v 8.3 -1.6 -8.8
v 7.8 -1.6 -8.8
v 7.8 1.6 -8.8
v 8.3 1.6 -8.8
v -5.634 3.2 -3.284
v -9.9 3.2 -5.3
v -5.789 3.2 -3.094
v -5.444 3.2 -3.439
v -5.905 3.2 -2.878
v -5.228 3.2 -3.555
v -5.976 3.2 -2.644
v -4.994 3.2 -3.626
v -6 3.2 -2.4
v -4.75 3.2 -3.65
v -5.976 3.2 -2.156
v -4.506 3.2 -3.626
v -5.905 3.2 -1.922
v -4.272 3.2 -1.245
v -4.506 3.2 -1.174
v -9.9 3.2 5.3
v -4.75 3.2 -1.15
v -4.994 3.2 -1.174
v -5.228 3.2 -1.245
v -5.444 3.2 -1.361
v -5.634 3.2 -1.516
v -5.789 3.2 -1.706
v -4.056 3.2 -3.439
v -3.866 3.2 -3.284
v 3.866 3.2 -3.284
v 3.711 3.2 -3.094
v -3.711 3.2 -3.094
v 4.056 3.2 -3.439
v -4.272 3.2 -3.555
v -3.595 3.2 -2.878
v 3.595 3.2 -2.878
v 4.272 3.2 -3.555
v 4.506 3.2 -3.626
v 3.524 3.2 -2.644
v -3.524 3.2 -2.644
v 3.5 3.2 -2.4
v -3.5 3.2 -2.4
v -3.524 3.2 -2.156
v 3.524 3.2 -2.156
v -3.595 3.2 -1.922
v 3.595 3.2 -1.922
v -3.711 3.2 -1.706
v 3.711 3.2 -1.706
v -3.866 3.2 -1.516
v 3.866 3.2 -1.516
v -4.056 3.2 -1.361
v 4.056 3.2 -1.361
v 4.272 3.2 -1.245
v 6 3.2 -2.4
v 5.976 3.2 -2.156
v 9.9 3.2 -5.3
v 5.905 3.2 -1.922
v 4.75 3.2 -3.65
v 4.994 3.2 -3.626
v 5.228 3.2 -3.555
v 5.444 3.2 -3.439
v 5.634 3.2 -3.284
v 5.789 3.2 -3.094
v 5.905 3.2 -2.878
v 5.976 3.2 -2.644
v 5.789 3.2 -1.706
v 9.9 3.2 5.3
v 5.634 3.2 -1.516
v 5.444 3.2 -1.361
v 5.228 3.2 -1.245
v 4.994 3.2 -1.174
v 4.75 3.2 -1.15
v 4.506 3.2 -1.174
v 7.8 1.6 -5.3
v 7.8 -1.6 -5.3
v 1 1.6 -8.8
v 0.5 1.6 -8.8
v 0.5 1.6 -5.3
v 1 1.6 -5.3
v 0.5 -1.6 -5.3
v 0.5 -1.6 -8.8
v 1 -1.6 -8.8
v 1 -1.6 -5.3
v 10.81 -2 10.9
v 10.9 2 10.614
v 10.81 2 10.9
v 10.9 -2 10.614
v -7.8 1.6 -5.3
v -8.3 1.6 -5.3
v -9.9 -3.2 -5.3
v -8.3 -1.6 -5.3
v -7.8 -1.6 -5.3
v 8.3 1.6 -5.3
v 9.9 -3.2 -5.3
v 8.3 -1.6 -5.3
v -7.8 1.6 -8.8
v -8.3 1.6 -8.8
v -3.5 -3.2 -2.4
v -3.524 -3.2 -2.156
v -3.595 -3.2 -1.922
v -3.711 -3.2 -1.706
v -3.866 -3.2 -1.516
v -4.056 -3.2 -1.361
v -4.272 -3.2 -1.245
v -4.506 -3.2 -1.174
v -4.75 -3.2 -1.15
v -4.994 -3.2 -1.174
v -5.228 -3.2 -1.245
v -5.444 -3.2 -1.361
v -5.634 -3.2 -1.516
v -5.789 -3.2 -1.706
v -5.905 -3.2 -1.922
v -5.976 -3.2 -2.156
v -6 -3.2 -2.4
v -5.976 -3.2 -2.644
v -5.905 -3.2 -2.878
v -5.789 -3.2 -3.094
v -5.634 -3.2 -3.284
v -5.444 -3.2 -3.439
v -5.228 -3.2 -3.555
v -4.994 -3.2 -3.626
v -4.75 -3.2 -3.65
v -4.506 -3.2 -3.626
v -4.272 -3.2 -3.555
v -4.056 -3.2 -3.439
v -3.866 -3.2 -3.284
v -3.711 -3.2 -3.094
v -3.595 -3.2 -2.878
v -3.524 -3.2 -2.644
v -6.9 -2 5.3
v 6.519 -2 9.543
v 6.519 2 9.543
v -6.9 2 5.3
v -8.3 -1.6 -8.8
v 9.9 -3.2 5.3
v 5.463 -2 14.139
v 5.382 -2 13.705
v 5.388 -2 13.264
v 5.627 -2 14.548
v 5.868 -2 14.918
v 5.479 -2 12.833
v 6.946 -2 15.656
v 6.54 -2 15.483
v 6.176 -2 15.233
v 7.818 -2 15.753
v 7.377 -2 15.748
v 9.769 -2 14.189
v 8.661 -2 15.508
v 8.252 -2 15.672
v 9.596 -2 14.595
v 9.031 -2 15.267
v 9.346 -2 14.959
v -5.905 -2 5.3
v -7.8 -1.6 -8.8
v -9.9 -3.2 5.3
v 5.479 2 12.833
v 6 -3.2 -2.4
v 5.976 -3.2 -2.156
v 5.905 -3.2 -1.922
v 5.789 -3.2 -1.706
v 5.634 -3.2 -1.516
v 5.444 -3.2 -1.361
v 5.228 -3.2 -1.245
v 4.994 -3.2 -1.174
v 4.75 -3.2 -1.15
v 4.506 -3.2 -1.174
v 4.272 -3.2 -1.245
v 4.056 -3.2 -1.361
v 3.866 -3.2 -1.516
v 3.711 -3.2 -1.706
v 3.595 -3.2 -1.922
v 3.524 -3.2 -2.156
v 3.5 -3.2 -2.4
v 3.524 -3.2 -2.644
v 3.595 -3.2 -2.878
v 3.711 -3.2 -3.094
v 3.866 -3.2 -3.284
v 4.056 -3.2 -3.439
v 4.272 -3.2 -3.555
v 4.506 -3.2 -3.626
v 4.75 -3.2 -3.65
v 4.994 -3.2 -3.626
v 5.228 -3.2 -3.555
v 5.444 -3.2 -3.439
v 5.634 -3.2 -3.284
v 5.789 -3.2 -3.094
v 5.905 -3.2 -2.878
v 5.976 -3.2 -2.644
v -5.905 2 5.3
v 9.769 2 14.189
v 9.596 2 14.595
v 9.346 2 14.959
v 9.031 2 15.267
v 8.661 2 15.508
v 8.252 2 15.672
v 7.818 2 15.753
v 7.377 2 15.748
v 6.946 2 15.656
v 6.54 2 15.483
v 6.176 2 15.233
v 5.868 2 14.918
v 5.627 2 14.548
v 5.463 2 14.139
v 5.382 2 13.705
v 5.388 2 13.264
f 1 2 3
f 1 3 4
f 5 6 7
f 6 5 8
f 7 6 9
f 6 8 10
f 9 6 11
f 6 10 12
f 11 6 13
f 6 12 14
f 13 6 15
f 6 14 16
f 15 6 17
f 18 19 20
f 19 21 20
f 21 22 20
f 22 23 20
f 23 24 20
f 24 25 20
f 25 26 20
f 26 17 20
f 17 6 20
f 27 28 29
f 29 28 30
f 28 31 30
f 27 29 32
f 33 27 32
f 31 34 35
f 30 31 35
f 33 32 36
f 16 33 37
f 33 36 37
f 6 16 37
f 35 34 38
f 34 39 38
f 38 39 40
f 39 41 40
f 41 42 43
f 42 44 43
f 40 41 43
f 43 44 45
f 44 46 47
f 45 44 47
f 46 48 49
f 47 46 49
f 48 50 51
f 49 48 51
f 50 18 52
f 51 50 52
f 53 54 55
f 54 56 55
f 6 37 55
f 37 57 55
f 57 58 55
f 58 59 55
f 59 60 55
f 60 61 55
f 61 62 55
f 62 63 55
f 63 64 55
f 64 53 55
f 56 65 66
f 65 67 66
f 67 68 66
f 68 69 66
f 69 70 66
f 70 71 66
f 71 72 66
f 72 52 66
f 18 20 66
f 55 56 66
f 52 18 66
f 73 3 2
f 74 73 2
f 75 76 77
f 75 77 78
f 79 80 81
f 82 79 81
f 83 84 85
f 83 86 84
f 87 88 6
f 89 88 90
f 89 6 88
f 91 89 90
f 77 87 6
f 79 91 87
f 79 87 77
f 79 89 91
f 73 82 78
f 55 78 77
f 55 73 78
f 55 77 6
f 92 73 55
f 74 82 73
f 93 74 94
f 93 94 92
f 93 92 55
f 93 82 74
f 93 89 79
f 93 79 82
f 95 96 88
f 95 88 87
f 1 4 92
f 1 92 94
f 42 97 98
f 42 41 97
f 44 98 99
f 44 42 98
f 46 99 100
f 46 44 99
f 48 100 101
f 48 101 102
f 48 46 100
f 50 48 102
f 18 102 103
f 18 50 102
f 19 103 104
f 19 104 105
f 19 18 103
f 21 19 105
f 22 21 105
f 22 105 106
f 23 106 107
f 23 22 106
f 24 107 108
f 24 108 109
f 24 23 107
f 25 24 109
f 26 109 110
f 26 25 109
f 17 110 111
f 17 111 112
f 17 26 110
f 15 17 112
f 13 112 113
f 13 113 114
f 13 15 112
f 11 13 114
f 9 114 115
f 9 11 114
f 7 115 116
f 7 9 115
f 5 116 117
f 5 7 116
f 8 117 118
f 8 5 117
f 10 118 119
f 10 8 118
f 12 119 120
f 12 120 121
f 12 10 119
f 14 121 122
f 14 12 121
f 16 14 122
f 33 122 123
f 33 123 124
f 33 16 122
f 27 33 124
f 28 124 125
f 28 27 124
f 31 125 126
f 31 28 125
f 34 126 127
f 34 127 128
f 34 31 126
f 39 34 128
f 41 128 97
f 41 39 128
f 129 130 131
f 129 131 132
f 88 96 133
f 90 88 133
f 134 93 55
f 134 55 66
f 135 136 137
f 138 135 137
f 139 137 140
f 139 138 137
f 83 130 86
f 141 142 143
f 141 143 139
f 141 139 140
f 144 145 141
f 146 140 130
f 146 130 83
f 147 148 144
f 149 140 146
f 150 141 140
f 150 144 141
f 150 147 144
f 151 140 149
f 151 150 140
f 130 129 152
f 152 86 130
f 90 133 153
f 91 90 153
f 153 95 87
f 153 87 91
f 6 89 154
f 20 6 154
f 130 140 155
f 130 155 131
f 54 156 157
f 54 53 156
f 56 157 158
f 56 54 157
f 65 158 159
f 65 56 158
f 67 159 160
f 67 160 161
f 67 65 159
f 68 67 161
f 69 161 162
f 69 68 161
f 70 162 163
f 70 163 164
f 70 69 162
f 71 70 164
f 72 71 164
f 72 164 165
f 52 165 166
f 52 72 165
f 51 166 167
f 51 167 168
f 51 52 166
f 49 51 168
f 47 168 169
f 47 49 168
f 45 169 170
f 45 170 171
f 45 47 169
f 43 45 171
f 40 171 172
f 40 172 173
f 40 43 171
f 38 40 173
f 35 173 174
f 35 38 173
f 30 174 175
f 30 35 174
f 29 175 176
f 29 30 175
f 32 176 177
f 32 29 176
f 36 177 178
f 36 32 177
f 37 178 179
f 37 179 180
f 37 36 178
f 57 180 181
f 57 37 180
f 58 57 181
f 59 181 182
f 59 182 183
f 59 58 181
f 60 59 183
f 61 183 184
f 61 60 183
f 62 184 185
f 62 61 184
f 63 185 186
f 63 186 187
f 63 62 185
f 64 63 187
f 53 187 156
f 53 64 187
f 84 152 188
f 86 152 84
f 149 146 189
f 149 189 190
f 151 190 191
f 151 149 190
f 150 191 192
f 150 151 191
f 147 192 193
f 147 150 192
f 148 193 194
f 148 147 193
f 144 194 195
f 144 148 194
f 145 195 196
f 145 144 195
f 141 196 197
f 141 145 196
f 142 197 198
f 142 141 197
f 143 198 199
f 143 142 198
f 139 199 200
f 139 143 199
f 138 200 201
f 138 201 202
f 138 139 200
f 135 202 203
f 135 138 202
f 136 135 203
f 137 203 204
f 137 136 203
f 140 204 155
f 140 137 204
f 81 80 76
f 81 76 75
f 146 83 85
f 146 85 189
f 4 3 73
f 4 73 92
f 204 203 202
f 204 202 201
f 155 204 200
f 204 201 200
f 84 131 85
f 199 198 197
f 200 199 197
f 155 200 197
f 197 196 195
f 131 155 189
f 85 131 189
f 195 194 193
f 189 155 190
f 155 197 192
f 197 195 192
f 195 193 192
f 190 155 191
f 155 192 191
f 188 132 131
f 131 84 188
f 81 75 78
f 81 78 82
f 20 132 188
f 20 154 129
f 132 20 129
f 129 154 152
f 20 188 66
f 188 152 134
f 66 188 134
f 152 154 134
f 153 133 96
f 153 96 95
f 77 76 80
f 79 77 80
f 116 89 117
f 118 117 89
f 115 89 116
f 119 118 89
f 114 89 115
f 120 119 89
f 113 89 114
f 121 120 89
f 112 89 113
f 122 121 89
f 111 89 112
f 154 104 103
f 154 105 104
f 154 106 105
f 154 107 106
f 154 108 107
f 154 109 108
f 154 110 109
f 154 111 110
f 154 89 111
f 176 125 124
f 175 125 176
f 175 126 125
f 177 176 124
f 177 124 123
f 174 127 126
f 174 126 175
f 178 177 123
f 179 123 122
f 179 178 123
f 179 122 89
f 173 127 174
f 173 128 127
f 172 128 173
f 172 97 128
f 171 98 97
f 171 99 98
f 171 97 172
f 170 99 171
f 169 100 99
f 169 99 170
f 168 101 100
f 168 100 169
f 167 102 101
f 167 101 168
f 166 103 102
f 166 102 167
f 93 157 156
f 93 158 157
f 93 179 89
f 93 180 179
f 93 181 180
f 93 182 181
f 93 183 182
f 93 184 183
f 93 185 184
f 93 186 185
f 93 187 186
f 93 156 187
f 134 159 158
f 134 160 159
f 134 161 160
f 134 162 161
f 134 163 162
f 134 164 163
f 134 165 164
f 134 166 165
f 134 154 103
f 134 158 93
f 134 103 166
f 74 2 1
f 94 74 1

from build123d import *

# Parameters (mm, degrees)
F0_W     = 19.8
F0_H     = 10.6
F0_R     = 1.25
F1_DEPTH = 3.2
F2_W     = 0.5
F2_H     = 3.2
F3_DEPTH = 3.5
F5_DEPTH = 2
F7_DEPTH = 4


with BuildPart() as f1:
    # F0 (on Front) → F1 (new body, symmetric)
    with BuildSketch(Plane.XZ):
        Rectangle(F0_W, F0_H)
        with Locations((-4.75, -2.4)):
            Circle(F0_R, mode=Mode.SUBTRACT)
        with Locations((4.75, -2.4)):
            Circle(F0_R, mode=Mode.SUBTRACT)
    extrude(amount=F1_DEPTH, both=True)

    # F2 (on face) → F3 (join)
    with BuildSketch(Plane(origin=(0, 0, -5.3), x_dir=(1, 0, 0), z_dir=(0, 0, -1))):
        with Locations((-8.05, 0)):
            Rectangle(F2_W, F2_H)
        with Locations((0.75, 0)):
            Rectangle(F2_W, F2_H)
        with Locations((8.05, 0)):
            Rectangle(F2_W, F2_H)
    extrude(amount=F3_DEPTH)

    # F4 (on Front) → F5 (join, symmetric)
    with BuildSketch(Plane.XZ):
        Polygon((10.80955, 10.9), (-6.9, 5.3), (-5.904972, 5.3), (10.9, 10.61396), align=None)
    extrude(amount=F5_DEPTH, both=True)

    # F6 (on face) → F7 (join, through all)
    with BuildSketch(Plane.XZ.offset(2)):
        with BuildLine():
            Line((6.518951, 9.543254), (10.80955, 10.9))
            Line((10.80955, 10.9), (9.769379, 14.189459))
            ThreePointArc((9.769379, 14.189459), (6.945706, 15.656386), (5.478779, 12.832714))
            Line((5.478779, 12.832714), (6.518951, 9.543254))
        make_face()
    extrude(amount=-F7_DEPTH)


solid = f1.part
